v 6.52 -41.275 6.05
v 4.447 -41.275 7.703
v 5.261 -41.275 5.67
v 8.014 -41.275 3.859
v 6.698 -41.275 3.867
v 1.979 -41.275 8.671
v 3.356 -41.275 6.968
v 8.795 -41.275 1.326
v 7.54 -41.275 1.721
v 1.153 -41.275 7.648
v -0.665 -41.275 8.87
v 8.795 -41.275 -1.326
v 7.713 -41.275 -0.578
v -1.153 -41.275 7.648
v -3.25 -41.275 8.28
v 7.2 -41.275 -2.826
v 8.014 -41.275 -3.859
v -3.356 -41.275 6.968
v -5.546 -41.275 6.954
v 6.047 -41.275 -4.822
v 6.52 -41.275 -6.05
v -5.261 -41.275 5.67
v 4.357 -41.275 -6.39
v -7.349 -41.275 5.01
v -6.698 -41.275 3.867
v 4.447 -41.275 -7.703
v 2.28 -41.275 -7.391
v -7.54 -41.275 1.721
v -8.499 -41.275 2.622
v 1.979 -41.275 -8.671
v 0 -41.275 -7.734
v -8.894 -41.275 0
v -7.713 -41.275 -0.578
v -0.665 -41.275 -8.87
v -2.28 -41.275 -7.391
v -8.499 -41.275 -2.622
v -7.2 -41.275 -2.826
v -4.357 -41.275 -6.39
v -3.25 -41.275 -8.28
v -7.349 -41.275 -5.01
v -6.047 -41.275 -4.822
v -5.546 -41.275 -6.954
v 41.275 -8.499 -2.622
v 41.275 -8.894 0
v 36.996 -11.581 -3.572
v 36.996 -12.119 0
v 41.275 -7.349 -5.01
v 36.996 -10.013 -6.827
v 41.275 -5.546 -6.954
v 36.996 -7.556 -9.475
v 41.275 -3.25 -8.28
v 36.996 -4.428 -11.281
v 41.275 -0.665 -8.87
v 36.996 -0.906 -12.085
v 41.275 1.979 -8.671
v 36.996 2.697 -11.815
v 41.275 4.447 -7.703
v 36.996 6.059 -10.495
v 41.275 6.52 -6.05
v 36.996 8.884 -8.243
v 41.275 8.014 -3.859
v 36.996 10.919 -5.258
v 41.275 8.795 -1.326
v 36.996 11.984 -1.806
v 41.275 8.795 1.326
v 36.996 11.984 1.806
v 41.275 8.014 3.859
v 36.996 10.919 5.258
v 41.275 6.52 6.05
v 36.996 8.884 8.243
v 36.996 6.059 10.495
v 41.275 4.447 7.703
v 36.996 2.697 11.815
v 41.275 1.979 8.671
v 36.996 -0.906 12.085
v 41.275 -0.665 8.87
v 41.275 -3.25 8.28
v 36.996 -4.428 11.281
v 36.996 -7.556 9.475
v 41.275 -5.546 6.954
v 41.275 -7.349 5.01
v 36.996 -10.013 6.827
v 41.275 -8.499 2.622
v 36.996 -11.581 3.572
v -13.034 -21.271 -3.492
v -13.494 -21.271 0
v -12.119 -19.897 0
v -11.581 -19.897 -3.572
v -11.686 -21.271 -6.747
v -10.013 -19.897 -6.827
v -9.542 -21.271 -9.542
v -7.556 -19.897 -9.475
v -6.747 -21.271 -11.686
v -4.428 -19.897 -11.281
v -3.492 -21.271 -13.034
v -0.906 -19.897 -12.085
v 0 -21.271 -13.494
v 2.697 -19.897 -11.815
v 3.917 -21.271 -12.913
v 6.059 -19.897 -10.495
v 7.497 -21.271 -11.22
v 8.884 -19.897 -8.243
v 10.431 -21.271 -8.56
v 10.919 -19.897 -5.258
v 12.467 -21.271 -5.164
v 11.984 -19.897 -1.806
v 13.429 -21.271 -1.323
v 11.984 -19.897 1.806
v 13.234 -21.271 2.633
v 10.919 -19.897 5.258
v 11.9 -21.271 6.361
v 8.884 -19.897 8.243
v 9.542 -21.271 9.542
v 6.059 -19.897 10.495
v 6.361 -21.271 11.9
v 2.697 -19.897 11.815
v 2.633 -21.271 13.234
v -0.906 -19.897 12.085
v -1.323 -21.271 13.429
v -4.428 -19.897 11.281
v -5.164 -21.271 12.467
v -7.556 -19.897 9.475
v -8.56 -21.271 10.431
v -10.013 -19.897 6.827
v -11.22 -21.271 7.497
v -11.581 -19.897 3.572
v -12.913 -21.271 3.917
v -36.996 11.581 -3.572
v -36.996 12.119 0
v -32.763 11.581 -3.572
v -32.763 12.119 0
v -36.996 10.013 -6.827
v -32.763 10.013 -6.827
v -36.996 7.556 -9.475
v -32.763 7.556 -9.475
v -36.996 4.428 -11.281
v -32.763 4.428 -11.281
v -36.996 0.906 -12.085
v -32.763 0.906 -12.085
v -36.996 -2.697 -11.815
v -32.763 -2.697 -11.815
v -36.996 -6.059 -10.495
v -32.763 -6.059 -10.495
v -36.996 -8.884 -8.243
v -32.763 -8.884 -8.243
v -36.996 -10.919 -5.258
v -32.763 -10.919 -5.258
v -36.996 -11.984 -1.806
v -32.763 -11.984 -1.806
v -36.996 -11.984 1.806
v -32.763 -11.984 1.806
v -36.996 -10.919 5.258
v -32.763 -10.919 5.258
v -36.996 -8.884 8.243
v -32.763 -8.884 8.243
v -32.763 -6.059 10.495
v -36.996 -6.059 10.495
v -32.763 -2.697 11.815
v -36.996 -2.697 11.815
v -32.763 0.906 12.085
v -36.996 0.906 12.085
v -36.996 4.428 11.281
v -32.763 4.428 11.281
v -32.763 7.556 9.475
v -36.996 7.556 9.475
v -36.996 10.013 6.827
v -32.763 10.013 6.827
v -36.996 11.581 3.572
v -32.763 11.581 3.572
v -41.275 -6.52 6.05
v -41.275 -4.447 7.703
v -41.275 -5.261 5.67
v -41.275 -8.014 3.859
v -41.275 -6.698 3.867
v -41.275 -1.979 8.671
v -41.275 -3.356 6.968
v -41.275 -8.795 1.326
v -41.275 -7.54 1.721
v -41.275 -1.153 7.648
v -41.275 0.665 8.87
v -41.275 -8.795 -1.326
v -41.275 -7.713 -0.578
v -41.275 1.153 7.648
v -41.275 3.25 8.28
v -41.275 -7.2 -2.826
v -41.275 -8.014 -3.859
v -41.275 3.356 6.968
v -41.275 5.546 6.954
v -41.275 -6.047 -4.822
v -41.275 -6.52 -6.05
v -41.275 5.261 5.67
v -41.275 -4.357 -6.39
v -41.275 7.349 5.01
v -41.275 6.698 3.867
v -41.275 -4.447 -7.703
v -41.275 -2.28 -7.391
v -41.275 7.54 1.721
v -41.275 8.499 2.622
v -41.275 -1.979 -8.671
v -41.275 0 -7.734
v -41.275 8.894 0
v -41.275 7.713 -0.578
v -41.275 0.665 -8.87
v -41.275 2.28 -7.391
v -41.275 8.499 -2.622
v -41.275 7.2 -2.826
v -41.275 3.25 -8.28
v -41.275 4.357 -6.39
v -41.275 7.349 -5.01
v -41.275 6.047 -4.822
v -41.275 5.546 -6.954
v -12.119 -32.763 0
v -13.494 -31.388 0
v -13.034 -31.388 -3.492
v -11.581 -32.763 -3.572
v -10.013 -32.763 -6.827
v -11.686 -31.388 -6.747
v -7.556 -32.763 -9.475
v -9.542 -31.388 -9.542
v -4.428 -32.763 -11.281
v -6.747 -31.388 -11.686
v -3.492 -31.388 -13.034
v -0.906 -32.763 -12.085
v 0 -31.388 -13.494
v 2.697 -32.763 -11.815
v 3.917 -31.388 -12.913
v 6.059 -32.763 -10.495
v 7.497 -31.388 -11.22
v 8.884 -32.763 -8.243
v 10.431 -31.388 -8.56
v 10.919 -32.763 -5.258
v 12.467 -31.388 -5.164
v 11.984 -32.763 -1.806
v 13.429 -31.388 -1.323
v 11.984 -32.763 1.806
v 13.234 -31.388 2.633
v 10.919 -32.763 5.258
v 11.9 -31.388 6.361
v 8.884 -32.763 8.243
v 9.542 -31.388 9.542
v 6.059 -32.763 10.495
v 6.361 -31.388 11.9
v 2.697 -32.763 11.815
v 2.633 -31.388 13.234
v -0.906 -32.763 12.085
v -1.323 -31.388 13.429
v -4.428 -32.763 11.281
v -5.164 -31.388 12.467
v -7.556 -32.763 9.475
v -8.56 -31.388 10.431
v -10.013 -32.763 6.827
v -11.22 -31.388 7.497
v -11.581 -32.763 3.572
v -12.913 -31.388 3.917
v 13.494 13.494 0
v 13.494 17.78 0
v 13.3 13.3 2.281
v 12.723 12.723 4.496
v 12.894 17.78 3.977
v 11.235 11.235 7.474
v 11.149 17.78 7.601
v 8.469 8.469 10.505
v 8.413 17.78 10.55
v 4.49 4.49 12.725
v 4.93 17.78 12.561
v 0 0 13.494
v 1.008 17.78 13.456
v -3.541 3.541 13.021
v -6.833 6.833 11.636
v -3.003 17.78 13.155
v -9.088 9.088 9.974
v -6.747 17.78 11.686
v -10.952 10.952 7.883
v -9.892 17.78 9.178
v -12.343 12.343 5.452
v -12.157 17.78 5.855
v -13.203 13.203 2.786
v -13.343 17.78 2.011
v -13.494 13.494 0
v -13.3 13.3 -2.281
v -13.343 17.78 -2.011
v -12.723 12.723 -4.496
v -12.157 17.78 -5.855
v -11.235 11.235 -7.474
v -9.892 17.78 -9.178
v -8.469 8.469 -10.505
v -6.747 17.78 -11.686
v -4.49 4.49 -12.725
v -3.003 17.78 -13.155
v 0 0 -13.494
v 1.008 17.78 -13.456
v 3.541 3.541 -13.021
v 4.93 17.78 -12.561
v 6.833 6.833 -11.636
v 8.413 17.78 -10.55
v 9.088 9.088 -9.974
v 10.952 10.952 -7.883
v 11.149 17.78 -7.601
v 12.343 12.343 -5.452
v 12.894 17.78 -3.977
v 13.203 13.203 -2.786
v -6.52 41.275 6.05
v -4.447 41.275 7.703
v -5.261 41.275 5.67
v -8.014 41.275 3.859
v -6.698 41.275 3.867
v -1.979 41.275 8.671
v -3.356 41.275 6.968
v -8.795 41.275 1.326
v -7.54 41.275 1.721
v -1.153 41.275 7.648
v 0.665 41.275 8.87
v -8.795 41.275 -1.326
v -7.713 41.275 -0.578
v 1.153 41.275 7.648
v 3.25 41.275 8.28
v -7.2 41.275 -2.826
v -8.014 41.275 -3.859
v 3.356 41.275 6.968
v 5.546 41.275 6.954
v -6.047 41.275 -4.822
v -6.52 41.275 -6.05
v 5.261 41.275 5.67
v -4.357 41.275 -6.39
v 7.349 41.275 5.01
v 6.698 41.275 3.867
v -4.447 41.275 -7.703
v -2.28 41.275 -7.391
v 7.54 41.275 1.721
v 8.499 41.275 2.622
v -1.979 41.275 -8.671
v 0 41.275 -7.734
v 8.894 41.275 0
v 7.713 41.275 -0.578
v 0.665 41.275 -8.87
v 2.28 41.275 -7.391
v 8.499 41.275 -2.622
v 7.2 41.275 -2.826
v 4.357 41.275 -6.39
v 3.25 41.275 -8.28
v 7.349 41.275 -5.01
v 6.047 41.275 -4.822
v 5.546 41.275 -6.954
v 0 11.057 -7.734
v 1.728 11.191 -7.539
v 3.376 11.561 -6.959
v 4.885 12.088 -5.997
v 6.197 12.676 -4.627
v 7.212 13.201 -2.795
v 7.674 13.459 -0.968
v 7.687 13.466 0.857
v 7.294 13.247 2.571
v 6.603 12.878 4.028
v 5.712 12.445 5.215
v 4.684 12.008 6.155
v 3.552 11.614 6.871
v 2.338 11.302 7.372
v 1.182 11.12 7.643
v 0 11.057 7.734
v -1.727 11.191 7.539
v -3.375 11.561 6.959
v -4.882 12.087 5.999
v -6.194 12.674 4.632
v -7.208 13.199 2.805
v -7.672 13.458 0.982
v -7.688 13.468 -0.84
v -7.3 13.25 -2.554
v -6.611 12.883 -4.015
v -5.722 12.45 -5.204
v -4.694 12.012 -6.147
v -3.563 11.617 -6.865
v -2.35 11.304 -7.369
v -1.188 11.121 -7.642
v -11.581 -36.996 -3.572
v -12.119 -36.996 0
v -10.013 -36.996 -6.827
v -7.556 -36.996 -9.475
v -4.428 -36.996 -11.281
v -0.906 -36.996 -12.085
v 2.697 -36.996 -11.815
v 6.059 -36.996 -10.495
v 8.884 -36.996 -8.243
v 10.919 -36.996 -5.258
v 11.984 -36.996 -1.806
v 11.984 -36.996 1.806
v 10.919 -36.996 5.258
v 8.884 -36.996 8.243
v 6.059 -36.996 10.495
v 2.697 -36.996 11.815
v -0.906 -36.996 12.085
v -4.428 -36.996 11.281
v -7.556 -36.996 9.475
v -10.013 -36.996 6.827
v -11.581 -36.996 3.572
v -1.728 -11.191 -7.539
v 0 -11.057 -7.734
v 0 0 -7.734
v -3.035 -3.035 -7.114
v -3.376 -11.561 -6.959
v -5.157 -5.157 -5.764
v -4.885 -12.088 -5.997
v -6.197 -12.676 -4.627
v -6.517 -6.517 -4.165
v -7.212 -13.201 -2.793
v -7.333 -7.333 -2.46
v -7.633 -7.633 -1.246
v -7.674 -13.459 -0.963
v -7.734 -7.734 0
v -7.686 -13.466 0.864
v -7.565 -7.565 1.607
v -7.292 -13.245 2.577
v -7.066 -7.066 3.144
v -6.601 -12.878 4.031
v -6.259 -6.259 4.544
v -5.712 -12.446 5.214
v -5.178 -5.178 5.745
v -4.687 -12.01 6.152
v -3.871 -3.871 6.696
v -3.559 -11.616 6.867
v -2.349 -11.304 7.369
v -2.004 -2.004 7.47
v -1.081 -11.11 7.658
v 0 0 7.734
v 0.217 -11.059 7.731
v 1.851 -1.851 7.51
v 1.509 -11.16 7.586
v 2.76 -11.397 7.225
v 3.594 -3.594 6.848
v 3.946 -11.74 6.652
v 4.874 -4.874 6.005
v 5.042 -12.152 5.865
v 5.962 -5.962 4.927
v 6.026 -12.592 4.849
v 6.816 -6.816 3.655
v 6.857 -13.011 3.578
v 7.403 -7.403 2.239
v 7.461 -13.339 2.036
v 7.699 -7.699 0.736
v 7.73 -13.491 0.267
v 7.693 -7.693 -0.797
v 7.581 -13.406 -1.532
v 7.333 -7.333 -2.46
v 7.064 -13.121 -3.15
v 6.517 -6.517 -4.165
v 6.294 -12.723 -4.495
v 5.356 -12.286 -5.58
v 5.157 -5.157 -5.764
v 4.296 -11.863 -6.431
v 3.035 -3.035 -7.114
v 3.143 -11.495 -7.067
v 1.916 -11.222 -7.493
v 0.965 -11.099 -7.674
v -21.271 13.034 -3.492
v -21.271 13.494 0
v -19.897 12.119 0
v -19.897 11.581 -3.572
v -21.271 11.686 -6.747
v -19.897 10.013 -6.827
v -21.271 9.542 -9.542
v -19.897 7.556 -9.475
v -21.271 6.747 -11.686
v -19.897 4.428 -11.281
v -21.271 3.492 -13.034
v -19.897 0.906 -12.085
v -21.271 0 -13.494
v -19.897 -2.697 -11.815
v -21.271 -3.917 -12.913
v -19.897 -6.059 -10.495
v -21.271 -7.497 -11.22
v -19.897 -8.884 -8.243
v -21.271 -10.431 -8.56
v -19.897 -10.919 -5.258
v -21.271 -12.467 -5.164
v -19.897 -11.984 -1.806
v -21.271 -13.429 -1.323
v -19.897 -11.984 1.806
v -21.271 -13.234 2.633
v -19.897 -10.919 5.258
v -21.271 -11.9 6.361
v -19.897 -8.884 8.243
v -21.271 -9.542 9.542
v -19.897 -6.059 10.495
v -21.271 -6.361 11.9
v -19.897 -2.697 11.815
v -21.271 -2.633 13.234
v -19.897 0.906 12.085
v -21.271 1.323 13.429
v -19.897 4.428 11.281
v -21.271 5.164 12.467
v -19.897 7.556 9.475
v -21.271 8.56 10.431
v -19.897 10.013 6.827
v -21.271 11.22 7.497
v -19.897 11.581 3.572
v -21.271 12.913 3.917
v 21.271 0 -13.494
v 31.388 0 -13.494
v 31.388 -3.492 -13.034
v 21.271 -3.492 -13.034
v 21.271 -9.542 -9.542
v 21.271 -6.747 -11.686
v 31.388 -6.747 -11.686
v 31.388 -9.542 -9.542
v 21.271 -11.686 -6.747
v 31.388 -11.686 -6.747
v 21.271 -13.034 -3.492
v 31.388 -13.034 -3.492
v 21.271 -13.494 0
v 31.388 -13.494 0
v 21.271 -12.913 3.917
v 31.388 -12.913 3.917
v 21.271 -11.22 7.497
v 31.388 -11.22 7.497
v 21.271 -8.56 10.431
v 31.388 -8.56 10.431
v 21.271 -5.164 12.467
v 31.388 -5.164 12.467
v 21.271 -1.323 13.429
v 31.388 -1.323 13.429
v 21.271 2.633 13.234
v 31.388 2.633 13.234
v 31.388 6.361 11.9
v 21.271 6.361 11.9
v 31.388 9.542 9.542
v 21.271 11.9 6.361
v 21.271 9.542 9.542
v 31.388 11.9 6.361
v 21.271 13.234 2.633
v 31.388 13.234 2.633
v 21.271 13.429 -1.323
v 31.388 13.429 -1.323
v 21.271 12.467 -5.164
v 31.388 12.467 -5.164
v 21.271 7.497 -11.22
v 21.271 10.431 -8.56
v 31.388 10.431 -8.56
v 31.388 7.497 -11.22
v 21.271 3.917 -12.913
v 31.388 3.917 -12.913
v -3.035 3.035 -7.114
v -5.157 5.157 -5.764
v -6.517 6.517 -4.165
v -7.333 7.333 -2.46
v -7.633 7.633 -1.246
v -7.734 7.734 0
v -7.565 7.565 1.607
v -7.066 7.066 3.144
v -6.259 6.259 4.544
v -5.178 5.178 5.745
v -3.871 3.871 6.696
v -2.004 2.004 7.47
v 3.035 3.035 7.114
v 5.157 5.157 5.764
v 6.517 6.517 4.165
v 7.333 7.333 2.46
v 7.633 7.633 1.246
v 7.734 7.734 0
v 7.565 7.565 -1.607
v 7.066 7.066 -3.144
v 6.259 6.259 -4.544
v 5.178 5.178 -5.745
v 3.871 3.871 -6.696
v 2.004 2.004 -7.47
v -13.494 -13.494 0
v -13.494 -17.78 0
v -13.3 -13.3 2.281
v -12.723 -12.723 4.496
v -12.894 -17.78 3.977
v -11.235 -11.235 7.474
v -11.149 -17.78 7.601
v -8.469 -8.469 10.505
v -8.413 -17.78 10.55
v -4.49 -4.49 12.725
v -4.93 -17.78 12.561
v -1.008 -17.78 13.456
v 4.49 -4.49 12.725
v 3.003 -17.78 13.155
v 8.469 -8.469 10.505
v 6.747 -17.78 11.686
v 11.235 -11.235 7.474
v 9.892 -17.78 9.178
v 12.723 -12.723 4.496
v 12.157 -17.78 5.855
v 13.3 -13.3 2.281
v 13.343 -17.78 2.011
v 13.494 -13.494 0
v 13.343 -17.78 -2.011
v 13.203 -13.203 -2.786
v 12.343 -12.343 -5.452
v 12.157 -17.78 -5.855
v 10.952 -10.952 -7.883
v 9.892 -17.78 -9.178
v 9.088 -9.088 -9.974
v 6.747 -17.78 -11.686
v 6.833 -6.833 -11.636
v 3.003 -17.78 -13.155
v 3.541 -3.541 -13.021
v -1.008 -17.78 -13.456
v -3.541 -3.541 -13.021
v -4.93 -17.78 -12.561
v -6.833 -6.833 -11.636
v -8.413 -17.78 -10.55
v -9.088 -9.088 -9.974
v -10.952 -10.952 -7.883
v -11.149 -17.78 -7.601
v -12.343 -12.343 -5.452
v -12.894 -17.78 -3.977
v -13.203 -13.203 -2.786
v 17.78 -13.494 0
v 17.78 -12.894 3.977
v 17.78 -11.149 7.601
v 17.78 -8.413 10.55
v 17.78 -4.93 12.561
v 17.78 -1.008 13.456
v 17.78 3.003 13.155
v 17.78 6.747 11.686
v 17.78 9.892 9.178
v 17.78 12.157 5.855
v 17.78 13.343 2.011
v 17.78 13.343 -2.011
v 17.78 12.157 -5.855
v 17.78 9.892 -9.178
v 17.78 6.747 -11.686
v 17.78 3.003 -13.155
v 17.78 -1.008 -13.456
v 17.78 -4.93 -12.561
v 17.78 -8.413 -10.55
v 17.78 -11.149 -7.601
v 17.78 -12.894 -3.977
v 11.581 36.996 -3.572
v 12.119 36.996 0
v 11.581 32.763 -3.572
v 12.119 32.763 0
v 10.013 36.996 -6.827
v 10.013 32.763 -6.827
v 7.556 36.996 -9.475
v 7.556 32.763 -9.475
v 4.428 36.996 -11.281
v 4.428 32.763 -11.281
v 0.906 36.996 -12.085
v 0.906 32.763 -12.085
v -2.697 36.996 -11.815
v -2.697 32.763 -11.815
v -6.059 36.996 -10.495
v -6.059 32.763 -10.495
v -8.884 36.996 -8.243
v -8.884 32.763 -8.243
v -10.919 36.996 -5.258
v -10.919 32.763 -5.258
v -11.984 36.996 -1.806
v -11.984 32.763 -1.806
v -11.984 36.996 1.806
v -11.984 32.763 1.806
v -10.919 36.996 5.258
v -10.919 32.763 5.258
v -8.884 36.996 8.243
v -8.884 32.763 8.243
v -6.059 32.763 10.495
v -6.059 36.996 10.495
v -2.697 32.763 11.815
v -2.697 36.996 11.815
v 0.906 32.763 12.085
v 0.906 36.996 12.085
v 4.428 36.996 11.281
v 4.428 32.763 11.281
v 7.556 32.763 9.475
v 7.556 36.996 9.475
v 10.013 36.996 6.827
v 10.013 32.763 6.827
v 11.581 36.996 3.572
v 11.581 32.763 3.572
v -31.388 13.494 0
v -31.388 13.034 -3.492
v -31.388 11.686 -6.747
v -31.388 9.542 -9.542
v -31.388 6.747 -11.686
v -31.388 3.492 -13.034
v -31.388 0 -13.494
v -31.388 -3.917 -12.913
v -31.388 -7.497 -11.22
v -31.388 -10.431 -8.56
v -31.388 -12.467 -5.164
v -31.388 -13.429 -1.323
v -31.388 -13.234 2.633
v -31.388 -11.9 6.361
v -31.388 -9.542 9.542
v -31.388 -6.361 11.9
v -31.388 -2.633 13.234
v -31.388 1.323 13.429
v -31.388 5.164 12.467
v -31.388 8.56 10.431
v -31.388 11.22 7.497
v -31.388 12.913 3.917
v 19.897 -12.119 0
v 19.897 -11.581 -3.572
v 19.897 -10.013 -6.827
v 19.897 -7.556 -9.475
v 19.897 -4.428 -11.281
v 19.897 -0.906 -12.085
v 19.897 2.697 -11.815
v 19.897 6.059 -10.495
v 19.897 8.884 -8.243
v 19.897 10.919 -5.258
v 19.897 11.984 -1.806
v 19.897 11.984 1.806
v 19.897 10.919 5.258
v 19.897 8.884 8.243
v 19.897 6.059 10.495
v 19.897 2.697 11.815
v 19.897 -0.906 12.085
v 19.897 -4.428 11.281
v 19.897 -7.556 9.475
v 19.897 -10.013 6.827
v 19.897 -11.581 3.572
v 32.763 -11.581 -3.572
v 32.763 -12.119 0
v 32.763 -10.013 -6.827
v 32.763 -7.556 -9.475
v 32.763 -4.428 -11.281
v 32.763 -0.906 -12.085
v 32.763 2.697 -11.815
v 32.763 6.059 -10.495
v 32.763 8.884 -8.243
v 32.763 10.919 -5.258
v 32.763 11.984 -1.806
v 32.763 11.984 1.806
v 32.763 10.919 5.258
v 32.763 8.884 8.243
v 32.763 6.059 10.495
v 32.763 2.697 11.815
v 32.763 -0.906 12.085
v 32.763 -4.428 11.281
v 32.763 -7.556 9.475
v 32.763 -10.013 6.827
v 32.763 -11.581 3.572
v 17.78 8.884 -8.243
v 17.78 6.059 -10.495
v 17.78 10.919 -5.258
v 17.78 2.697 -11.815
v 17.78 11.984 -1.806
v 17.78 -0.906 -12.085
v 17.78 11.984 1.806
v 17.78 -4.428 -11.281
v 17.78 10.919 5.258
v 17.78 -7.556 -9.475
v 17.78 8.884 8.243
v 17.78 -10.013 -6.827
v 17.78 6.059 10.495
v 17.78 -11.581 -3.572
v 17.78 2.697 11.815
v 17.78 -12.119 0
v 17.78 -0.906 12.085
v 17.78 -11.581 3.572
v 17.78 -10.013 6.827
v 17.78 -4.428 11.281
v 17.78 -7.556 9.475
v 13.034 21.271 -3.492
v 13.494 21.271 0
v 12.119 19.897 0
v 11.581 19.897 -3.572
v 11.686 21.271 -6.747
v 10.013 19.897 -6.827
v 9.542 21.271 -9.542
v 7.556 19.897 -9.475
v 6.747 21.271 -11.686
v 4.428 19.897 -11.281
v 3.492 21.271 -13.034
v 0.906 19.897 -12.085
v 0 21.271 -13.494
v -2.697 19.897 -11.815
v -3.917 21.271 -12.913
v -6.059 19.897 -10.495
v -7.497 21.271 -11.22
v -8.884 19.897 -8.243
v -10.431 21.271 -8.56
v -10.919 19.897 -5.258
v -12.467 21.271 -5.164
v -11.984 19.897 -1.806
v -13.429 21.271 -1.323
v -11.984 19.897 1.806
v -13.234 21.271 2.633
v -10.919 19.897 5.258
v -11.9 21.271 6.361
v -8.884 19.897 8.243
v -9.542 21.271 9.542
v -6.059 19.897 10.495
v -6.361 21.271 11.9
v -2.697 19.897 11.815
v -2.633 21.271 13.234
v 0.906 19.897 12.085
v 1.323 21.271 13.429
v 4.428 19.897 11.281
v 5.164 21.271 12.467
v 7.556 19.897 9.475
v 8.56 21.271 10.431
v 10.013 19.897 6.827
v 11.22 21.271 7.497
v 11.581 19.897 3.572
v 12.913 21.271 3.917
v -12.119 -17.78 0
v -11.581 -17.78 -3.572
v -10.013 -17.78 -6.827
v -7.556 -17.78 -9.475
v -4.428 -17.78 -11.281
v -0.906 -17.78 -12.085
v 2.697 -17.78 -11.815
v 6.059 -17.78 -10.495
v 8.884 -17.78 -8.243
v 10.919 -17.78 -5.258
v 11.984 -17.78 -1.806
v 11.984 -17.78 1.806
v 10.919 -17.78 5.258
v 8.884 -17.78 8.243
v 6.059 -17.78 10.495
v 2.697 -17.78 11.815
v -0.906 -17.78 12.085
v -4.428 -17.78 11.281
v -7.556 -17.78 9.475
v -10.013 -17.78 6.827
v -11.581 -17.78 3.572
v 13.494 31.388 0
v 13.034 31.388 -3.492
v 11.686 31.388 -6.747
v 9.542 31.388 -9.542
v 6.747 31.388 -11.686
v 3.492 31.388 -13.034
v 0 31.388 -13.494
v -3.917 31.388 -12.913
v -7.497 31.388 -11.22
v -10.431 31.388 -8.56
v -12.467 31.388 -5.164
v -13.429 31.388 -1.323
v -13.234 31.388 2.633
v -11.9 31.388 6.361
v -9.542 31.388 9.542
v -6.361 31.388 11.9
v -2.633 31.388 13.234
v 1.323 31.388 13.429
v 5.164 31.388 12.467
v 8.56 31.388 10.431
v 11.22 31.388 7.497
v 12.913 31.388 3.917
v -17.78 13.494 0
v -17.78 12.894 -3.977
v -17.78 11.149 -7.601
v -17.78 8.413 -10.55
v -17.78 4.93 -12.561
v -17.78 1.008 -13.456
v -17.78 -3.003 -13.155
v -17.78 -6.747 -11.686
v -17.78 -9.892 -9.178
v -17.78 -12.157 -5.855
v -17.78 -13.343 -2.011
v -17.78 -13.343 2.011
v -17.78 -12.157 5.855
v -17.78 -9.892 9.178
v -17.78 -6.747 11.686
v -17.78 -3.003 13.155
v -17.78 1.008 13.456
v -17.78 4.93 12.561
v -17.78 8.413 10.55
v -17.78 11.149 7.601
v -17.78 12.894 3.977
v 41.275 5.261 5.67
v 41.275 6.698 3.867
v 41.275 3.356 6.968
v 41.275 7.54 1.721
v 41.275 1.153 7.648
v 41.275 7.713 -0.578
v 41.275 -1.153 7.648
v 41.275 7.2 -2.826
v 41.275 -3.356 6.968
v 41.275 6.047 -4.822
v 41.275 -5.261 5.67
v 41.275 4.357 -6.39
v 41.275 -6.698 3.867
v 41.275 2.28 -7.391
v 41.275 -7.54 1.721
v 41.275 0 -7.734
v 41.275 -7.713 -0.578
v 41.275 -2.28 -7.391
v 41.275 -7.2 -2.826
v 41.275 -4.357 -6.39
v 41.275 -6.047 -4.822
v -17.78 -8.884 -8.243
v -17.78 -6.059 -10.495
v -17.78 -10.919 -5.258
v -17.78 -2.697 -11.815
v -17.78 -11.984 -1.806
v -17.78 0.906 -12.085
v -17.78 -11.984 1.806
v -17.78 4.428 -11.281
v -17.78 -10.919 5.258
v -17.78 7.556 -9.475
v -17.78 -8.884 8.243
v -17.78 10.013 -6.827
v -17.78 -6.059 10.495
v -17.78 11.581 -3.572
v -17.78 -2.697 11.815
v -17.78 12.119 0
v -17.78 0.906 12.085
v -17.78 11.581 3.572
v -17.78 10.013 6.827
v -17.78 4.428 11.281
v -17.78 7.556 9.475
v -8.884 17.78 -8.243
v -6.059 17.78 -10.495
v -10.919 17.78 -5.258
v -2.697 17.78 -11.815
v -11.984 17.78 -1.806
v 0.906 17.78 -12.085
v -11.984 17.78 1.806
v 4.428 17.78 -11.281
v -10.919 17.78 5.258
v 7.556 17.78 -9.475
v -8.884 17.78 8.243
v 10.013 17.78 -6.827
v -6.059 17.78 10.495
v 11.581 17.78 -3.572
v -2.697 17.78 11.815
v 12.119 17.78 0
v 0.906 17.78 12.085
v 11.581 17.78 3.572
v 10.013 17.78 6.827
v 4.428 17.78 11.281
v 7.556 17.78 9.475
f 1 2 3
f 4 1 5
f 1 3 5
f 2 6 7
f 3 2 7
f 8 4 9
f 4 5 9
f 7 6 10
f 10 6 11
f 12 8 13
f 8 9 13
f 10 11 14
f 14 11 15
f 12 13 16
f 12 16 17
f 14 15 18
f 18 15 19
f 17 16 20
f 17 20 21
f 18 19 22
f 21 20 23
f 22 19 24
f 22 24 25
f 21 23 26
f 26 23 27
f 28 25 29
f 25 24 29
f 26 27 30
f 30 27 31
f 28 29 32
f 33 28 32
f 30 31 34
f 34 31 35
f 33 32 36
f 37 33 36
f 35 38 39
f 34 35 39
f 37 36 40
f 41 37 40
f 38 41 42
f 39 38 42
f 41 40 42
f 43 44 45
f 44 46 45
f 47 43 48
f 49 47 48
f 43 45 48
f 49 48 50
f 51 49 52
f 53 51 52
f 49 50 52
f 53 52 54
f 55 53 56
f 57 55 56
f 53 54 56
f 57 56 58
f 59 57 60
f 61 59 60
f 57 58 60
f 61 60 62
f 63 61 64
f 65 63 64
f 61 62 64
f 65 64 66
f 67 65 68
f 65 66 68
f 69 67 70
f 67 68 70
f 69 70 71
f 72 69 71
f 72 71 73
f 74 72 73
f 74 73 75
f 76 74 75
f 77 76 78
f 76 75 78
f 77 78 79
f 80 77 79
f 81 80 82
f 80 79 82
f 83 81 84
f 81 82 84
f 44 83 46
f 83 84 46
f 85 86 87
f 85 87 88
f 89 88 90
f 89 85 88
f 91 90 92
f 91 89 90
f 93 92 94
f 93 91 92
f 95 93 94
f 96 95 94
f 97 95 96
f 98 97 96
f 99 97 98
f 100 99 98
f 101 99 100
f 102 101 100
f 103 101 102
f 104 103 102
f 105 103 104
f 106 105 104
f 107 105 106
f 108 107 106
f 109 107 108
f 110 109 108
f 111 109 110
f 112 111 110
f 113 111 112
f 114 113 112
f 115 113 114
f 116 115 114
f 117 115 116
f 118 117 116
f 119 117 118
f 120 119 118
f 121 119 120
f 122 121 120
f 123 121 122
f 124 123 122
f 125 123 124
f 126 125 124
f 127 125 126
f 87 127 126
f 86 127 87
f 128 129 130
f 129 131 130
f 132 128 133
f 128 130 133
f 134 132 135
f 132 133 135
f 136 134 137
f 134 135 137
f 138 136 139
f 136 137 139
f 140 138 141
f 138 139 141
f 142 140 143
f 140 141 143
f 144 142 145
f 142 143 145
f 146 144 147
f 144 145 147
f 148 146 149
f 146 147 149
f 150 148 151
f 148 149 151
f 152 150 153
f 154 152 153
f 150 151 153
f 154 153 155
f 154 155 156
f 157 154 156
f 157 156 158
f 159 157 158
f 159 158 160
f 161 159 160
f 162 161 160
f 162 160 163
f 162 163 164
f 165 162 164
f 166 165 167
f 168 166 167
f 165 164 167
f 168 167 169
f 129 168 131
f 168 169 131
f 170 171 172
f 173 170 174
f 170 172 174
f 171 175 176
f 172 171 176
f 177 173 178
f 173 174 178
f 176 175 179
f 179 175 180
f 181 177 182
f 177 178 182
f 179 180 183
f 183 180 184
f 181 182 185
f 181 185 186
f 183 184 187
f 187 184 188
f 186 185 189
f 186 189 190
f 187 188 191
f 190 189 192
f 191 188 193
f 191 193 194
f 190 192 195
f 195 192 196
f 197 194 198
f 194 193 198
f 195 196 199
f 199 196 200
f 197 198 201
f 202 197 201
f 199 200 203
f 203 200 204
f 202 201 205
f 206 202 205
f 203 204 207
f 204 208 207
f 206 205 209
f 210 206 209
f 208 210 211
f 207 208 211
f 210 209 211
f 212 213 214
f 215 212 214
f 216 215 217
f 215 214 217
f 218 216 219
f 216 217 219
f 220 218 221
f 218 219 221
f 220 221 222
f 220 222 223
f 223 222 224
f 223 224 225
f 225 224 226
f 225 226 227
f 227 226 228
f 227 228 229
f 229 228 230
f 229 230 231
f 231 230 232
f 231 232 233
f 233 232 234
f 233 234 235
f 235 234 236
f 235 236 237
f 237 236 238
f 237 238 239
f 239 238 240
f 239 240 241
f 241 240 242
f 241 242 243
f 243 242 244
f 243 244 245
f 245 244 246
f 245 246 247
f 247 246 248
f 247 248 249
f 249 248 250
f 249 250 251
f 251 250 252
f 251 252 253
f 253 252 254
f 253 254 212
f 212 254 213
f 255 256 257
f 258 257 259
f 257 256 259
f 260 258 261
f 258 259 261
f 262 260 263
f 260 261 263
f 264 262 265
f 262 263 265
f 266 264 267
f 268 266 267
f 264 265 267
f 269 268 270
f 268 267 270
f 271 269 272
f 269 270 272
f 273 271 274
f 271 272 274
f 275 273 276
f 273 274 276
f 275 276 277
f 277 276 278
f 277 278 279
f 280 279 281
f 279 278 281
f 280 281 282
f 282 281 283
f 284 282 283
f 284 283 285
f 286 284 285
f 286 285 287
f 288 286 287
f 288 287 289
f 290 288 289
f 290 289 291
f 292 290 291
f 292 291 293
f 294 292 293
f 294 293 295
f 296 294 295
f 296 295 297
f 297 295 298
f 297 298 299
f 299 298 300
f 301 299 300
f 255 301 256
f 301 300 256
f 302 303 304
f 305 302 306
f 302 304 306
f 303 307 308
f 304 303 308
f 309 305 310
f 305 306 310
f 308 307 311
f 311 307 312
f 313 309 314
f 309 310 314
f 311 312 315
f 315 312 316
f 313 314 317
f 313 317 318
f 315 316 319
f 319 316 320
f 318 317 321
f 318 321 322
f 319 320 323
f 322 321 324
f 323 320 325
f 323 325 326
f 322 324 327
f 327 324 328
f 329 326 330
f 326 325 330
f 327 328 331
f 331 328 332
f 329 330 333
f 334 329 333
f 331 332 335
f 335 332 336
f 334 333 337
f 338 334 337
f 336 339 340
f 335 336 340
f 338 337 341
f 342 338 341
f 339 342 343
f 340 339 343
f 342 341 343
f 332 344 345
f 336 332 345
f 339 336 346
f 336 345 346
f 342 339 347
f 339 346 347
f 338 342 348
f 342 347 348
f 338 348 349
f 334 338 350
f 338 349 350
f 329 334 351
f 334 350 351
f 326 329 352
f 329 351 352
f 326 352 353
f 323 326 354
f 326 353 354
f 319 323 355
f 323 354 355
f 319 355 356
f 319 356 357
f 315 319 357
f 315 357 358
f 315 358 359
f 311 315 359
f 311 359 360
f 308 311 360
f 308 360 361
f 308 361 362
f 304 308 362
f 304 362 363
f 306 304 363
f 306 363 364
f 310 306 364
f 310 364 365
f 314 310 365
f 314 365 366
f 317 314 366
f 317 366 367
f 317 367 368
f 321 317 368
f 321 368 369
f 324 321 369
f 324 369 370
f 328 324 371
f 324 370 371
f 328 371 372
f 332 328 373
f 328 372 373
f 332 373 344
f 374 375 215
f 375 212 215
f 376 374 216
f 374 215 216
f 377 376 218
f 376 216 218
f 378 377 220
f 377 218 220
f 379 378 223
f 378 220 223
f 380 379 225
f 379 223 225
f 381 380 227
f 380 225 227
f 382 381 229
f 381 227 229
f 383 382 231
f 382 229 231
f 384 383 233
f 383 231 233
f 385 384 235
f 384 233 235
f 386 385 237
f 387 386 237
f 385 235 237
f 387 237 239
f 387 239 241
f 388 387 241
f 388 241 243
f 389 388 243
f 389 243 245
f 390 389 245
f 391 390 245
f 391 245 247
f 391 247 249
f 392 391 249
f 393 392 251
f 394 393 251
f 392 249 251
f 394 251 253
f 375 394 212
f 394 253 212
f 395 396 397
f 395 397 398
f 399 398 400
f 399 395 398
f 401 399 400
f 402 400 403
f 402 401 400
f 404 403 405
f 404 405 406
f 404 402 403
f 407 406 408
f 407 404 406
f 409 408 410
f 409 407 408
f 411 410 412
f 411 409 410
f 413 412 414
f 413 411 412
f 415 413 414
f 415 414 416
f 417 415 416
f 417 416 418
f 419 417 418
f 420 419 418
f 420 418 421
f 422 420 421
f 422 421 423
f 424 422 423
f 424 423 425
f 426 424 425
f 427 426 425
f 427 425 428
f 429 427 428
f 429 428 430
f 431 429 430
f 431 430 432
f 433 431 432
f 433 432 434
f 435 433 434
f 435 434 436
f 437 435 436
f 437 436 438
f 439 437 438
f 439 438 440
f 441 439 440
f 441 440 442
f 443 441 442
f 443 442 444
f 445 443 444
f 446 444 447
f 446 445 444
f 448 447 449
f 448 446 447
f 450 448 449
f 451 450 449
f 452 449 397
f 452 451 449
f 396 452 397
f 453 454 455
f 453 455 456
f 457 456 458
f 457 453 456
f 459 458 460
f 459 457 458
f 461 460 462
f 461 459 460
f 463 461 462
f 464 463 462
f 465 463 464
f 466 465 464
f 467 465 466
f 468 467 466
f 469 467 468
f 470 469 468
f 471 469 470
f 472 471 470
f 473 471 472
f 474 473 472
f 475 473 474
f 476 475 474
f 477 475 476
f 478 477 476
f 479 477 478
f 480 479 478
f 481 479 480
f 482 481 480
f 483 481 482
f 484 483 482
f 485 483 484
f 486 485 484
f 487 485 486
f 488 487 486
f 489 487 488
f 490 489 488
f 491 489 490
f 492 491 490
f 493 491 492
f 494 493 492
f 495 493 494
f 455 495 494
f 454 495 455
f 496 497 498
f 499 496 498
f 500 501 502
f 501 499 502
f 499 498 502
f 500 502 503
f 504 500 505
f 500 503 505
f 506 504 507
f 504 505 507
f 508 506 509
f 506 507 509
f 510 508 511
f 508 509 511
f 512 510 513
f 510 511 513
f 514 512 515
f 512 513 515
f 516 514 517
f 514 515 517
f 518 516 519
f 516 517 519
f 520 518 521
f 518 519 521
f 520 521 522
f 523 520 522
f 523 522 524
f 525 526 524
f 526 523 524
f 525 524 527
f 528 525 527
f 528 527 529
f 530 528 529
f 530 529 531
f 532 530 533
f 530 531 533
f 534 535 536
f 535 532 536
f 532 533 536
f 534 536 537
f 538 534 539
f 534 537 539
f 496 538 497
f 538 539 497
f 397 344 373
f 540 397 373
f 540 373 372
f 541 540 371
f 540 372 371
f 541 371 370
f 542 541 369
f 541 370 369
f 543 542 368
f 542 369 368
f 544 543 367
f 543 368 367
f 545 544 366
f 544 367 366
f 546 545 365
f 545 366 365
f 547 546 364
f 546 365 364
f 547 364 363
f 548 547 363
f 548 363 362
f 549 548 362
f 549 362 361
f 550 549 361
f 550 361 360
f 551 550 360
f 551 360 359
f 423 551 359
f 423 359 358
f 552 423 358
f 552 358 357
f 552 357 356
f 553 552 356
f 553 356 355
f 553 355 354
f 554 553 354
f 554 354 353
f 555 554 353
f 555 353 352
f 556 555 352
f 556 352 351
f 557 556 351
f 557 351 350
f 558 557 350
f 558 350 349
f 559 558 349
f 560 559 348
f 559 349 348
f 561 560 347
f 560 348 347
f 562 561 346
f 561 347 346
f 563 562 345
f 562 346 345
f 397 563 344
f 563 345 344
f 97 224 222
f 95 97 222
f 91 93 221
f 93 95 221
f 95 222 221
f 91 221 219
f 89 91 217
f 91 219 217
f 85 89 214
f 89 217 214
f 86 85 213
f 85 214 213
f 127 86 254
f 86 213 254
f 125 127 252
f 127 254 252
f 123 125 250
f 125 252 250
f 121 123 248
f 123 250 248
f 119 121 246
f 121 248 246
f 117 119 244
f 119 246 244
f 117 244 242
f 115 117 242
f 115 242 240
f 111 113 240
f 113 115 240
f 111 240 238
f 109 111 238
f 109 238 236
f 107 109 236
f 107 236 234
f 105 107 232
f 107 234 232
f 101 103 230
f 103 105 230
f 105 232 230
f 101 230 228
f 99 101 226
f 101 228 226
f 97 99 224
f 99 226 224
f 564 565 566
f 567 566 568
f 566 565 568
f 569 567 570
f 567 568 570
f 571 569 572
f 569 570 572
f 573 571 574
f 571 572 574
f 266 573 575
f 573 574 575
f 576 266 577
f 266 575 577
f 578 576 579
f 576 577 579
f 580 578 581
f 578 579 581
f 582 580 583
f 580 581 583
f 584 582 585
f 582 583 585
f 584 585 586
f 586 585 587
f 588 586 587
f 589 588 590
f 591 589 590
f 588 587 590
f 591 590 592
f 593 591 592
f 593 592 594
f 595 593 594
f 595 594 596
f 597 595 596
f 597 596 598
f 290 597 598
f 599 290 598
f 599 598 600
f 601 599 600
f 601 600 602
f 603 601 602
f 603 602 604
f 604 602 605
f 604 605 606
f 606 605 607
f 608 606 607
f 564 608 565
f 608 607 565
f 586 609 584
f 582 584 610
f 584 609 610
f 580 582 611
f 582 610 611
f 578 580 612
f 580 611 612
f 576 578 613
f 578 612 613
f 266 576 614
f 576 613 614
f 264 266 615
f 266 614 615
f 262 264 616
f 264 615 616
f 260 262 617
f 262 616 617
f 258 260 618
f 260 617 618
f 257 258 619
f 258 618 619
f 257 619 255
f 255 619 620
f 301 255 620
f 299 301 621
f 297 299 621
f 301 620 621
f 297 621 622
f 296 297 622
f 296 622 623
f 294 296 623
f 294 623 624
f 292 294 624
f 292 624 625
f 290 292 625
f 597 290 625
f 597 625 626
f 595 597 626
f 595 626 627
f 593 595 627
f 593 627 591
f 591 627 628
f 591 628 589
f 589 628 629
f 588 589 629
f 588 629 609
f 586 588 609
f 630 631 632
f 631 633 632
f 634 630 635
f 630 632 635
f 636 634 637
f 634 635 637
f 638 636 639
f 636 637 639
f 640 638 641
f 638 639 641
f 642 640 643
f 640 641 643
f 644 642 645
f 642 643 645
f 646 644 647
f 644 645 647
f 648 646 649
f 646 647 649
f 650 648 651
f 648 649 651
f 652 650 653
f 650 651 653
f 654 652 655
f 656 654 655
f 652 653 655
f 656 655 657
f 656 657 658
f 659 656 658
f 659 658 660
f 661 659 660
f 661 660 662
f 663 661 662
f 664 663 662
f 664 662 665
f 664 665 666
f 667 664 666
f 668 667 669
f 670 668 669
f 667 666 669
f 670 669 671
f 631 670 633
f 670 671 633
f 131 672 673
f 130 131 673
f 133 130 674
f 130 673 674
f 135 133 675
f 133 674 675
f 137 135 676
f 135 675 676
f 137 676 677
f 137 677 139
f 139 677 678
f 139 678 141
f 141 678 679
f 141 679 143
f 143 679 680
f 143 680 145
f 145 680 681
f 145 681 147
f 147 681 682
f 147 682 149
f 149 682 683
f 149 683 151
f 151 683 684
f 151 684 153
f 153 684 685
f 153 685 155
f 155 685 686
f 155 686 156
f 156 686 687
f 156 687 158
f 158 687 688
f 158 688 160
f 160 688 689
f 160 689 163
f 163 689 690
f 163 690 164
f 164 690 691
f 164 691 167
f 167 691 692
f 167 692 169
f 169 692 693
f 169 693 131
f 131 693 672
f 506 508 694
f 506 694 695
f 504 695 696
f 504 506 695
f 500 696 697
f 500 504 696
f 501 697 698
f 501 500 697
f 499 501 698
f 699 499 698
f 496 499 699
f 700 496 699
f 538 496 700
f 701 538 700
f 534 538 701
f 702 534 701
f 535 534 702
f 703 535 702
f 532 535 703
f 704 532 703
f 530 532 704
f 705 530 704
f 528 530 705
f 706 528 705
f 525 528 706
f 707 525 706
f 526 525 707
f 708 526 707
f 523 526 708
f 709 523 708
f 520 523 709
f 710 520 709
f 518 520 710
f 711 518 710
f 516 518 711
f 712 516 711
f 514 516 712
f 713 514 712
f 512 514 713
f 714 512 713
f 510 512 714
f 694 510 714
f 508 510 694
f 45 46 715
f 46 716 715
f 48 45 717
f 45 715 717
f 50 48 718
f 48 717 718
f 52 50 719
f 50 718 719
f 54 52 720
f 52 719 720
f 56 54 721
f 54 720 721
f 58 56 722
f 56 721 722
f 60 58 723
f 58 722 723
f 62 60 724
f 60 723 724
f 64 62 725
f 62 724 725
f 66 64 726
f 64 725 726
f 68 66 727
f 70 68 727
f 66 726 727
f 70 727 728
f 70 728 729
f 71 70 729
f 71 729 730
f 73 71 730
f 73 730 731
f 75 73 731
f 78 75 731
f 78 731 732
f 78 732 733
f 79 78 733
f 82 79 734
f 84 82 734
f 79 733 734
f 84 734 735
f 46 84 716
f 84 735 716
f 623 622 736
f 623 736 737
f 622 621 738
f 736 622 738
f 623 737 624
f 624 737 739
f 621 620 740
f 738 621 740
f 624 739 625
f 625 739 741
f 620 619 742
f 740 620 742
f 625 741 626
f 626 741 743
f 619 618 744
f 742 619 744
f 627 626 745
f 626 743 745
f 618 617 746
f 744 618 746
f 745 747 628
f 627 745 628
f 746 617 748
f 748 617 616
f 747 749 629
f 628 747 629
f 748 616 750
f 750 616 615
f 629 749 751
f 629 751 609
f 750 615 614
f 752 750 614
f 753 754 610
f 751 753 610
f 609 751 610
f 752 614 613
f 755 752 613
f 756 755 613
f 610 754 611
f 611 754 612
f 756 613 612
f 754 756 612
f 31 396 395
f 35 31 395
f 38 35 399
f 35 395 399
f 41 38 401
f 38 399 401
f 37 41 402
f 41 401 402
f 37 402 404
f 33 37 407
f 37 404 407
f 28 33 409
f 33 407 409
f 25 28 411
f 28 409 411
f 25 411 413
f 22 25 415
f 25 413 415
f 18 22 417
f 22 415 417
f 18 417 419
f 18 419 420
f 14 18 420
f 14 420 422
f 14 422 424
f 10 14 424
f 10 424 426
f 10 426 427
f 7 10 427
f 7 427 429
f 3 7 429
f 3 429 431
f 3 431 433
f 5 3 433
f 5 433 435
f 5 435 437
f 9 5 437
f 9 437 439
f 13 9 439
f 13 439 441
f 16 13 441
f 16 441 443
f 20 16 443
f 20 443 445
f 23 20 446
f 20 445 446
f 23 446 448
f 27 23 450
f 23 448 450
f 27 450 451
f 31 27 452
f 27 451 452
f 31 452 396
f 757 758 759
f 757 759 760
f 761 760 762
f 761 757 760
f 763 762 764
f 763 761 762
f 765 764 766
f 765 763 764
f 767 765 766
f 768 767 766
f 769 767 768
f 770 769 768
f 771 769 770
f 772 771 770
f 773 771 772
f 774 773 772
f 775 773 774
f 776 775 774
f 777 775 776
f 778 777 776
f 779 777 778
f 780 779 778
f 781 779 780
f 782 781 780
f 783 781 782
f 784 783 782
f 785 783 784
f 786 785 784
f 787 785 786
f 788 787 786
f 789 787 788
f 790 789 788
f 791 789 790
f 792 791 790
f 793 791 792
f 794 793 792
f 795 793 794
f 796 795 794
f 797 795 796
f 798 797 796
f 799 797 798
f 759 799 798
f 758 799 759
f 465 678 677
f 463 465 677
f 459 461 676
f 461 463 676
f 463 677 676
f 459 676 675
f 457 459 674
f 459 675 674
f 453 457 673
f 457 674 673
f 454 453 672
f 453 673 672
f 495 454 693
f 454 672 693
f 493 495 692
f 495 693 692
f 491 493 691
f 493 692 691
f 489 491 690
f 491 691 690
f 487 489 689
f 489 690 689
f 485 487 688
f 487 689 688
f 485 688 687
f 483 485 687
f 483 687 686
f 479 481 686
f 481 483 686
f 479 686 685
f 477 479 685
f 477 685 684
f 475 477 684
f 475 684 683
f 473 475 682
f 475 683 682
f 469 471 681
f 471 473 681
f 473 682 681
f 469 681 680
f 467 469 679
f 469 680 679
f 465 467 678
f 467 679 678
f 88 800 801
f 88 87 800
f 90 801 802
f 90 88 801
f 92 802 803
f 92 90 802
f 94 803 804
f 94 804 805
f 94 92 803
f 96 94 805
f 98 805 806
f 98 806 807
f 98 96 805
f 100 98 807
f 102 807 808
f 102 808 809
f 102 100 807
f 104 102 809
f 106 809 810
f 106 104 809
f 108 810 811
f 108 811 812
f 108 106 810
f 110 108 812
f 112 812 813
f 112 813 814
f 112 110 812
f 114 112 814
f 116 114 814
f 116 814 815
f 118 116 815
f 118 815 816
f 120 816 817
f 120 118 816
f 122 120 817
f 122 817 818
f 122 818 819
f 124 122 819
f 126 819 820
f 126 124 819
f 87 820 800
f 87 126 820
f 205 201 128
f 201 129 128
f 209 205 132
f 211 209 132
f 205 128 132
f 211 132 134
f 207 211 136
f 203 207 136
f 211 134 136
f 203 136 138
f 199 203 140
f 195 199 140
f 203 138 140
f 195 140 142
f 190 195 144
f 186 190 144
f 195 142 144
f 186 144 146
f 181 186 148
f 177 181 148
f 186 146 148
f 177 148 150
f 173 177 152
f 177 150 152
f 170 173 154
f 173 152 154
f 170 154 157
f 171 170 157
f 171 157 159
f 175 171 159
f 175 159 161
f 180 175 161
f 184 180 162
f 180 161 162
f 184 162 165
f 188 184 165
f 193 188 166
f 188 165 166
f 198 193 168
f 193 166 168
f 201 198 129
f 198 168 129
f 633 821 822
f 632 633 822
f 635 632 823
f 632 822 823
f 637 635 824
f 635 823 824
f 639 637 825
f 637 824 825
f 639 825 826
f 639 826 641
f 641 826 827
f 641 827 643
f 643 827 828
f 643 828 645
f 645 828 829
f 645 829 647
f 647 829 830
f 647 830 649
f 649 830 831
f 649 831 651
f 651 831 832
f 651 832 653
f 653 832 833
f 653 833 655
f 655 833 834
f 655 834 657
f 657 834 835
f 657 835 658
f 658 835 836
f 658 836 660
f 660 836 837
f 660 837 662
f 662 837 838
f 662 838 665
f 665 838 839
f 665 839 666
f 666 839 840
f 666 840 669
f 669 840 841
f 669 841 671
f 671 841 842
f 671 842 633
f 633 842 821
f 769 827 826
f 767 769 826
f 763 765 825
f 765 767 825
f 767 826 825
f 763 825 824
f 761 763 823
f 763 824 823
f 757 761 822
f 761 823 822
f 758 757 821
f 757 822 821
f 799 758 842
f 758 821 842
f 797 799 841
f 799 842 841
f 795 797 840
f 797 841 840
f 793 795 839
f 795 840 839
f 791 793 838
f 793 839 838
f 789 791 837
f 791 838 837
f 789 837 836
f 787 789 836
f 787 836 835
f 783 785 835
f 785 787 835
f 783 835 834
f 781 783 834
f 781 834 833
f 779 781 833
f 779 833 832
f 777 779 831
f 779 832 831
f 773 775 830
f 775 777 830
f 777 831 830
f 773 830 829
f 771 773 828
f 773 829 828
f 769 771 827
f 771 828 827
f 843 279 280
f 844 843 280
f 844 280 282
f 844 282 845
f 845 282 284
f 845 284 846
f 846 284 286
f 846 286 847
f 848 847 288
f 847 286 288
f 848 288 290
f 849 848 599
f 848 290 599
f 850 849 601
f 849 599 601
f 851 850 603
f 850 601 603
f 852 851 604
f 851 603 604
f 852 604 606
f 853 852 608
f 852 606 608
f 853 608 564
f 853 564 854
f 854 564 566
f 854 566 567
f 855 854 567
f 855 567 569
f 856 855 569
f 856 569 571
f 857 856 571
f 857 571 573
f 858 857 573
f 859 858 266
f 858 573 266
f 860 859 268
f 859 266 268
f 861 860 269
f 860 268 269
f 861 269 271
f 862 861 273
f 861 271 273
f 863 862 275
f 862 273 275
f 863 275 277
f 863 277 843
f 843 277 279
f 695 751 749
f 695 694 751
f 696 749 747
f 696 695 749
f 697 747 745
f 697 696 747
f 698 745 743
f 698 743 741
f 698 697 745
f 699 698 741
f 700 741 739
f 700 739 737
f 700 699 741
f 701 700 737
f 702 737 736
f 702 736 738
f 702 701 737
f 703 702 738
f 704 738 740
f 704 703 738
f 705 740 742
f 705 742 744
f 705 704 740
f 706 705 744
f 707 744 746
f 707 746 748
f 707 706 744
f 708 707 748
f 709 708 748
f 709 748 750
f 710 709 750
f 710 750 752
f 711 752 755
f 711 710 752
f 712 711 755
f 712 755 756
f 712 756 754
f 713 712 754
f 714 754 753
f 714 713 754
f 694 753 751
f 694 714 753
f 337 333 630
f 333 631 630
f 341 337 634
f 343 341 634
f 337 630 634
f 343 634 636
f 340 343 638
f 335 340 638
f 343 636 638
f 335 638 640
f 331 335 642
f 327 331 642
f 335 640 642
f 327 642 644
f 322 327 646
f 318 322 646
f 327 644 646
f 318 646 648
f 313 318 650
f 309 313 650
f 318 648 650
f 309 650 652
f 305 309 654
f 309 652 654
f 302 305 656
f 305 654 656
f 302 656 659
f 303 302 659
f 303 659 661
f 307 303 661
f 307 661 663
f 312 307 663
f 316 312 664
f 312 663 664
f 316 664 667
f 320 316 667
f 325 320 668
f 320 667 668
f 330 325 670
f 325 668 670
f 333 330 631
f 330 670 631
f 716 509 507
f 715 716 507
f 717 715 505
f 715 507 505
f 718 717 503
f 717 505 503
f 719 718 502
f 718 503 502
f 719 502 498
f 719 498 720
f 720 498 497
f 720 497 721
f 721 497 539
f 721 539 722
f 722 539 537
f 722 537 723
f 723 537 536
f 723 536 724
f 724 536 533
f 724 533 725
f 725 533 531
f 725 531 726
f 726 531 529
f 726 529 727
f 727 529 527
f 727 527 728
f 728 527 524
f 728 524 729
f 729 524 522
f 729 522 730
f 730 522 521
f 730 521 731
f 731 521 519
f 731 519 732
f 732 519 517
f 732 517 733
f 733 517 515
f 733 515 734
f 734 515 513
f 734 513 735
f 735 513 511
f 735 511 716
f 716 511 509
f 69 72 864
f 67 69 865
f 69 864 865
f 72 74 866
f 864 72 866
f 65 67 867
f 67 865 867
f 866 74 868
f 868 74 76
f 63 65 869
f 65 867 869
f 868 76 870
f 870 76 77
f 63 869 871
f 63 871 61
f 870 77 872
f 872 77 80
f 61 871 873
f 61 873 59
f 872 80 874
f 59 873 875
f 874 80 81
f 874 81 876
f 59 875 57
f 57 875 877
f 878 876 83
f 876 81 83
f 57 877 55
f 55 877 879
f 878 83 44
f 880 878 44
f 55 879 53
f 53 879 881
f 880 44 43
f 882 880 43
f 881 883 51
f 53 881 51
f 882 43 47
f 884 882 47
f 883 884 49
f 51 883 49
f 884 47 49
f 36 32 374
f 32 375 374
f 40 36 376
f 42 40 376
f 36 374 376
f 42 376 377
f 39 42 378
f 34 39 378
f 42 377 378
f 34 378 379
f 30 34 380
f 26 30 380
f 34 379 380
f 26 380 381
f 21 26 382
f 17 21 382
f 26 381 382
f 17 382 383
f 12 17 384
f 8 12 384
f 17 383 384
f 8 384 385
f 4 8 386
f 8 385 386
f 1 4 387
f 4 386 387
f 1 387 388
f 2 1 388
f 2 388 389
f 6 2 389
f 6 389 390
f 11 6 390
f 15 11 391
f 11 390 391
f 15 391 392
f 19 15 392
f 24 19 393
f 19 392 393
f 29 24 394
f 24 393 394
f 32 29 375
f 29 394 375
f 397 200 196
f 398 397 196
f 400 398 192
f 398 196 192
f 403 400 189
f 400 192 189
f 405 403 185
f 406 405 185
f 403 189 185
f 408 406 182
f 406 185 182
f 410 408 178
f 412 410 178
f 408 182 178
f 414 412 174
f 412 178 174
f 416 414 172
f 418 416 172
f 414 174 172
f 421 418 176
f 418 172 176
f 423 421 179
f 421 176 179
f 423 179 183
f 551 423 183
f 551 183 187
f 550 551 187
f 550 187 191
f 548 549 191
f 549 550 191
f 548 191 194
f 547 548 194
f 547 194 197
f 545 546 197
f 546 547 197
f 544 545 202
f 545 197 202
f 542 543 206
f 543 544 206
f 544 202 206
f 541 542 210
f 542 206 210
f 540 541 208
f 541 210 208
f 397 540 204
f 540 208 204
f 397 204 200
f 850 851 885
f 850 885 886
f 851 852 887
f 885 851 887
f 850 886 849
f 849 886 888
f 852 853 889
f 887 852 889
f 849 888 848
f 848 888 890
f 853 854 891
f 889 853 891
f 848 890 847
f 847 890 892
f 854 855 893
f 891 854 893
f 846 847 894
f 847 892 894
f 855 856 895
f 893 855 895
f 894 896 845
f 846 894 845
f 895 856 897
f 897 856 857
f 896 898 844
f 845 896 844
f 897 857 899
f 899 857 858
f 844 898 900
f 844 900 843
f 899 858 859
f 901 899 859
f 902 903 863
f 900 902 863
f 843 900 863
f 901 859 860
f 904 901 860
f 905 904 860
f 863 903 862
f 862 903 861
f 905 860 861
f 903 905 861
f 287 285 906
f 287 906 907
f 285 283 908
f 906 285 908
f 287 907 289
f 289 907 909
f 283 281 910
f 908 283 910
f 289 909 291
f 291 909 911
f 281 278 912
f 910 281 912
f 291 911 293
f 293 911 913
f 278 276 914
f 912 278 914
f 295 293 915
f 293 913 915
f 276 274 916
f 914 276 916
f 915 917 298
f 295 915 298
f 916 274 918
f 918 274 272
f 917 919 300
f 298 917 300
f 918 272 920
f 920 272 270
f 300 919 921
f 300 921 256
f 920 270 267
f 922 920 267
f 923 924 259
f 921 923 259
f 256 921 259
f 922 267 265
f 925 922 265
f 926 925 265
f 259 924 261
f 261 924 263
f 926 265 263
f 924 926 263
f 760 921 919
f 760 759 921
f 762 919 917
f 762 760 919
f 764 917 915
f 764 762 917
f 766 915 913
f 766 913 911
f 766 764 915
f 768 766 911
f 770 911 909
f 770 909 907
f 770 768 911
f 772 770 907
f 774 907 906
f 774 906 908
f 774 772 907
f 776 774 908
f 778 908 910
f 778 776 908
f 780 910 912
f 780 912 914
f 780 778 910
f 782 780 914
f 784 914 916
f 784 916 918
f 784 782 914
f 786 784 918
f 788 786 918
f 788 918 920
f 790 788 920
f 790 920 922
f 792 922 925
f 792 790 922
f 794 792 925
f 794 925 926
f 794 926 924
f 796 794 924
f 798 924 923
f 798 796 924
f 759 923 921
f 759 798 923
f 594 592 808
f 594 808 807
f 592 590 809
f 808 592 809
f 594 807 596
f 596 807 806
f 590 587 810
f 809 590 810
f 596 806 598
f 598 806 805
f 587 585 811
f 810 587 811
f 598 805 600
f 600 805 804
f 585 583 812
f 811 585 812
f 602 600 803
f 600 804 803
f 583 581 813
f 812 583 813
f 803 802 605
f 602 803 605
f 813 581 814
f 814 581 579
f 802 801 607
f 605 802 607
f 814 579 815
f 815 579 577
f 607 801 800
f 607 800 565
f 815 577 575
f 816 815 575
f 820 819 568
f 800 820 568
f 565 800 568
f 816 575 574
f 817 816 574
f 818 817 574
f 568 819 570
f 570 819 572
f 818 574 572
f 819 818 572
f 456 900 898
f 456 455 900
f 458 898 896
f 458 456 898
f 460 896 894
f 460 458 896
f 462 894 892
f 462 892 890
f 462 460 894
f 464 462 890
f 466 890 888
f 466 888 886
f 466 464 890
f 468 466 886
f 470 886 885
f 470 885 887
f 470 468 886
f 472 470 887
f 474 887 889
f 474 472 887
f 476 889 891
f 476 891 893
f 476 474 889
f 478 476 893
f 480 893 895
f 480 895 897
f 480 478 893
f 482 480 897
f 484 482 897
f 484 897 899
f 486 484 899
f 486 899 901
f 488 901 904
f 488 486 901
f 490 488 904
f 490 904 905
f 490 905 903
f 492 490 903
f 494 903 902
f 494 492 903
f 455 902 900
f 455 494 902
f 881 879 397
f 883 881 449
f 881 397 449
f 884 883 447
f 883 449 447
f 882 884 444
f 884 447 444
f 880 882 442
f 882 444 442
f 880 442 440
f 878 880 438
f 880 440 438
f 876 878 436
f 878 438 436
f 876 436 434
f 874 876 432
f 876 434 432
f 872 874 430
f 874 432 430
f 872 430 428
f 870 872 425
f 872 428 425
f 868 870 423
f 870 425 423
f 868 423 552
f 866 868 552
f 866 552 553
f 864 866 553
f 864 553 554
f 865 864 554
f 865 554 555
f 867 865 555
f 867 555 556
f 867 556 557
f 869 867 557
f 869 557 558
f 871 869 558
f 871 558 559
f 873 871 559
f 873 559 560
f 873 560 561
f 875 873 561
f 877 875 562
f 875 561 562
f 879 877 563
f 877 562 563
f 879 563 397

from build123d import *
from build123d.topology import SkipClean

# Parameters (mm, degrees)
SKETCH2_R               = 13.49375
EXTRUDE1_DEPTH          = 23.495
SKETCH15_R              = 13.49375
BOSS_EXTRUDE1_DEPTH     = 17.78
SKETCH16_R              = 7.7343
CUT_EXTRUDE1_DEPTH      = 46.47293924
CIRPATTERN1_COUNT       = 4
CIRPATTERN1_ANGLE       = 270
SKETCH17_R              = 7.7343
CUT_EXTRUDE2_DEPTH      = 94.274913101
CUT_EXTRUDE3_REACH      = 95.275
SKETCH18_R              = 7.7343
CUT_EXTRUDE4_DEPTH      = 60.911038679
CUT_EXTRUDE4_DEPTH_BACK = 60.911038679
SKETCH19_R              = 7.7343
CUT_EXTRUDE5_DEPTH      = 60.911038679
CUT_EXTRUDE5_DEPTH_BACK = 60.911038679
SKETCH20_R              = 7.7343


with BuildPart() as part:
    # Sketch2 → Extrude1 (new body)
    with BuildSketch(Plane(origin=(-41.275, 0, 0), x_dir=(0, 0, -1), z_dir=(1, 0, 0))):
        Circle(SKETCH2_R)
    extrude(amount=EXTRUDE1_DEPTH)

    # Sketch5 → Cut-Revolve1 (revolve, cut)
    with BuildSketch(Plane.XY):
        Polygon((-36.995957679, 12.118934671), (-32.762624346, 12.118934671), (-31.387809017, 13.49375), (-41.275, 13.49375), (-41.275, 8.894445), align=None)
        Polygon((-17.78, 12.118934671), (-19.896666667, 12.118934671), (-21.271481995, 13.49375), (-17.78, 13.49375), align=None)
    revolve(axis=Axis((0, 0, 0), (-1, 0, 0)), mode=Mode.SUBTRACT)

    # Sketch15 → Boss-Extrude1 (add)
    with BuildSketch(Plane(origin=(-17.78, 0, 0), x_dir=(0, 0, -1), z_dir=(1, 0, 0))):
        with Locations(Location((0, 0, 0), (0, 0, 90))):
            Circle(SKETCH15_R)
    extrude(amount=BOSS_EXTRUDE1_DEPTH)

    # Sketch16 → Cut-Extrude1 (cut, through all)
    with BuildSketch(Plane(origin=(0, 0, 0), x_dir=(0, 0, -1), z_dir=(1, 0, 0))):
        Circle(SKETCH16_R)
    extrude(amount=-CUT_EXTRUDE1_DEPTH, mode=Mode.SUBTRACT)


with BuildPart() as cirpattern1_1:
    # CirPattern1: pattern copy
    add(part.part.rotate(Axis((0, 0, 0), (0, 0, -1)), 1 * CIRPATTERN1_ANGLE / (CIRPATTERN1_COUNT - 1)))

    # Sketch17 → Cut-Extrude2 (cut, through all)
    with BuildSketch(Plane.ZY.offset(41.275)):
        with Locations(Location((0, 0, 0), (0, 0, 180))):
            Circle(SKETCH17_R)
    extrude(amount=-CUT_EXTRUDE2_DEPTH, mode=Mode.SUBTRACT)


with BuildPart() as cirpattern1_2:
    # CirPattern1: pattern copy
    add(part.part.rotate(Axis((0, 0, 0), (0, 0, -1)), 2 * CIRPATTERN1_ANGLE / (CIRPATTERN1_COUNT - 1)))


with BuildPart() as cirpattern1_3:
    # CirPattern1: pattern copy
    add(part.part.rotate(Axis((0, 0, 0), (0, 0, -1)), 3 * CIRPATTERN1_ANGLE / (CIRPATTERN1_COUNT - 1)))


with BuildPart() as cirpattern1_1_1:
    add(cirpattern1_1.part)

    # Combine1: union part, CirPattern1_2, CirPattern1_3
    add(part.part)
    add(cirpattern1_2.part)
    add(cirpattern1_3.part)

    # Sketch18 → Cut-Extrude3 (cut, up to next)
    with BuildSketch(Plane(origin=(0, 41.275, 0), x_dir=(1, 0, 0), z_dir=(0, 1, 0)), mode=Mode.PRIVATE) as cut_extrude3_sk1:
        with Locations(Location((0, 0, 0), (0, 0, 90))):
            Circle(SKETCH18_R)
    cut_extrude3_tool1 = extrude(cut_extrude3_sk1.sketch, amount=-CUT_EXTRUDE3_REACH, mode=Mode.PRIVATE) & cirpattern1_1_1.part
    add(cut_extrude3_tool1.solids().sort_by_distance((0, 41.275, 0))[0], mode=Mode.SUBTRACT)

    # Sketch19 → Cut-Extrude4 (cut, two sides: drawn at the far end of the back side and taken through both)
    with SkipClean():  # the faces are left unmerged after this step: merging them gives an invalid solid
        with BuildSketch(Plane(origin=(0, 0, 0), x_dir=(0, 0, -1), z_dir=(1, 0, 0)).offset(-CUT_EXTRUDE4_DEPTH_BACK)):
            Circle(SKETCH19_R)
        extrude(amount=CUT_EXTRUDE4_DEPTH + CUT_EXTRUDE4_DEPTH_BACK, mode=Mode.SUBTRACT)

    # Sketch20 → Cut-Extrude5 (cut, two sides: drawn at the far end of the back side and taken through both)
    with BuildSketch(Plane(origin=(0, 0, 0), x_dir=(1, 0, 0), z_dir=(0, 1, 0)).offset(-CUT_EXTRUDE5_DEPTH_BACK)):
        with Locations(Location((0, 0, 0), (0, 0, 90))):
            Circle(SKETCH20_R)
    extrude(amount=CUT_EXTRUDE5_DEPTH + CUT_EXTRUDE5_DEPTH_BACK, mode=Mode.SUBTRACT)


solid = cirpattern1_1_1.part
